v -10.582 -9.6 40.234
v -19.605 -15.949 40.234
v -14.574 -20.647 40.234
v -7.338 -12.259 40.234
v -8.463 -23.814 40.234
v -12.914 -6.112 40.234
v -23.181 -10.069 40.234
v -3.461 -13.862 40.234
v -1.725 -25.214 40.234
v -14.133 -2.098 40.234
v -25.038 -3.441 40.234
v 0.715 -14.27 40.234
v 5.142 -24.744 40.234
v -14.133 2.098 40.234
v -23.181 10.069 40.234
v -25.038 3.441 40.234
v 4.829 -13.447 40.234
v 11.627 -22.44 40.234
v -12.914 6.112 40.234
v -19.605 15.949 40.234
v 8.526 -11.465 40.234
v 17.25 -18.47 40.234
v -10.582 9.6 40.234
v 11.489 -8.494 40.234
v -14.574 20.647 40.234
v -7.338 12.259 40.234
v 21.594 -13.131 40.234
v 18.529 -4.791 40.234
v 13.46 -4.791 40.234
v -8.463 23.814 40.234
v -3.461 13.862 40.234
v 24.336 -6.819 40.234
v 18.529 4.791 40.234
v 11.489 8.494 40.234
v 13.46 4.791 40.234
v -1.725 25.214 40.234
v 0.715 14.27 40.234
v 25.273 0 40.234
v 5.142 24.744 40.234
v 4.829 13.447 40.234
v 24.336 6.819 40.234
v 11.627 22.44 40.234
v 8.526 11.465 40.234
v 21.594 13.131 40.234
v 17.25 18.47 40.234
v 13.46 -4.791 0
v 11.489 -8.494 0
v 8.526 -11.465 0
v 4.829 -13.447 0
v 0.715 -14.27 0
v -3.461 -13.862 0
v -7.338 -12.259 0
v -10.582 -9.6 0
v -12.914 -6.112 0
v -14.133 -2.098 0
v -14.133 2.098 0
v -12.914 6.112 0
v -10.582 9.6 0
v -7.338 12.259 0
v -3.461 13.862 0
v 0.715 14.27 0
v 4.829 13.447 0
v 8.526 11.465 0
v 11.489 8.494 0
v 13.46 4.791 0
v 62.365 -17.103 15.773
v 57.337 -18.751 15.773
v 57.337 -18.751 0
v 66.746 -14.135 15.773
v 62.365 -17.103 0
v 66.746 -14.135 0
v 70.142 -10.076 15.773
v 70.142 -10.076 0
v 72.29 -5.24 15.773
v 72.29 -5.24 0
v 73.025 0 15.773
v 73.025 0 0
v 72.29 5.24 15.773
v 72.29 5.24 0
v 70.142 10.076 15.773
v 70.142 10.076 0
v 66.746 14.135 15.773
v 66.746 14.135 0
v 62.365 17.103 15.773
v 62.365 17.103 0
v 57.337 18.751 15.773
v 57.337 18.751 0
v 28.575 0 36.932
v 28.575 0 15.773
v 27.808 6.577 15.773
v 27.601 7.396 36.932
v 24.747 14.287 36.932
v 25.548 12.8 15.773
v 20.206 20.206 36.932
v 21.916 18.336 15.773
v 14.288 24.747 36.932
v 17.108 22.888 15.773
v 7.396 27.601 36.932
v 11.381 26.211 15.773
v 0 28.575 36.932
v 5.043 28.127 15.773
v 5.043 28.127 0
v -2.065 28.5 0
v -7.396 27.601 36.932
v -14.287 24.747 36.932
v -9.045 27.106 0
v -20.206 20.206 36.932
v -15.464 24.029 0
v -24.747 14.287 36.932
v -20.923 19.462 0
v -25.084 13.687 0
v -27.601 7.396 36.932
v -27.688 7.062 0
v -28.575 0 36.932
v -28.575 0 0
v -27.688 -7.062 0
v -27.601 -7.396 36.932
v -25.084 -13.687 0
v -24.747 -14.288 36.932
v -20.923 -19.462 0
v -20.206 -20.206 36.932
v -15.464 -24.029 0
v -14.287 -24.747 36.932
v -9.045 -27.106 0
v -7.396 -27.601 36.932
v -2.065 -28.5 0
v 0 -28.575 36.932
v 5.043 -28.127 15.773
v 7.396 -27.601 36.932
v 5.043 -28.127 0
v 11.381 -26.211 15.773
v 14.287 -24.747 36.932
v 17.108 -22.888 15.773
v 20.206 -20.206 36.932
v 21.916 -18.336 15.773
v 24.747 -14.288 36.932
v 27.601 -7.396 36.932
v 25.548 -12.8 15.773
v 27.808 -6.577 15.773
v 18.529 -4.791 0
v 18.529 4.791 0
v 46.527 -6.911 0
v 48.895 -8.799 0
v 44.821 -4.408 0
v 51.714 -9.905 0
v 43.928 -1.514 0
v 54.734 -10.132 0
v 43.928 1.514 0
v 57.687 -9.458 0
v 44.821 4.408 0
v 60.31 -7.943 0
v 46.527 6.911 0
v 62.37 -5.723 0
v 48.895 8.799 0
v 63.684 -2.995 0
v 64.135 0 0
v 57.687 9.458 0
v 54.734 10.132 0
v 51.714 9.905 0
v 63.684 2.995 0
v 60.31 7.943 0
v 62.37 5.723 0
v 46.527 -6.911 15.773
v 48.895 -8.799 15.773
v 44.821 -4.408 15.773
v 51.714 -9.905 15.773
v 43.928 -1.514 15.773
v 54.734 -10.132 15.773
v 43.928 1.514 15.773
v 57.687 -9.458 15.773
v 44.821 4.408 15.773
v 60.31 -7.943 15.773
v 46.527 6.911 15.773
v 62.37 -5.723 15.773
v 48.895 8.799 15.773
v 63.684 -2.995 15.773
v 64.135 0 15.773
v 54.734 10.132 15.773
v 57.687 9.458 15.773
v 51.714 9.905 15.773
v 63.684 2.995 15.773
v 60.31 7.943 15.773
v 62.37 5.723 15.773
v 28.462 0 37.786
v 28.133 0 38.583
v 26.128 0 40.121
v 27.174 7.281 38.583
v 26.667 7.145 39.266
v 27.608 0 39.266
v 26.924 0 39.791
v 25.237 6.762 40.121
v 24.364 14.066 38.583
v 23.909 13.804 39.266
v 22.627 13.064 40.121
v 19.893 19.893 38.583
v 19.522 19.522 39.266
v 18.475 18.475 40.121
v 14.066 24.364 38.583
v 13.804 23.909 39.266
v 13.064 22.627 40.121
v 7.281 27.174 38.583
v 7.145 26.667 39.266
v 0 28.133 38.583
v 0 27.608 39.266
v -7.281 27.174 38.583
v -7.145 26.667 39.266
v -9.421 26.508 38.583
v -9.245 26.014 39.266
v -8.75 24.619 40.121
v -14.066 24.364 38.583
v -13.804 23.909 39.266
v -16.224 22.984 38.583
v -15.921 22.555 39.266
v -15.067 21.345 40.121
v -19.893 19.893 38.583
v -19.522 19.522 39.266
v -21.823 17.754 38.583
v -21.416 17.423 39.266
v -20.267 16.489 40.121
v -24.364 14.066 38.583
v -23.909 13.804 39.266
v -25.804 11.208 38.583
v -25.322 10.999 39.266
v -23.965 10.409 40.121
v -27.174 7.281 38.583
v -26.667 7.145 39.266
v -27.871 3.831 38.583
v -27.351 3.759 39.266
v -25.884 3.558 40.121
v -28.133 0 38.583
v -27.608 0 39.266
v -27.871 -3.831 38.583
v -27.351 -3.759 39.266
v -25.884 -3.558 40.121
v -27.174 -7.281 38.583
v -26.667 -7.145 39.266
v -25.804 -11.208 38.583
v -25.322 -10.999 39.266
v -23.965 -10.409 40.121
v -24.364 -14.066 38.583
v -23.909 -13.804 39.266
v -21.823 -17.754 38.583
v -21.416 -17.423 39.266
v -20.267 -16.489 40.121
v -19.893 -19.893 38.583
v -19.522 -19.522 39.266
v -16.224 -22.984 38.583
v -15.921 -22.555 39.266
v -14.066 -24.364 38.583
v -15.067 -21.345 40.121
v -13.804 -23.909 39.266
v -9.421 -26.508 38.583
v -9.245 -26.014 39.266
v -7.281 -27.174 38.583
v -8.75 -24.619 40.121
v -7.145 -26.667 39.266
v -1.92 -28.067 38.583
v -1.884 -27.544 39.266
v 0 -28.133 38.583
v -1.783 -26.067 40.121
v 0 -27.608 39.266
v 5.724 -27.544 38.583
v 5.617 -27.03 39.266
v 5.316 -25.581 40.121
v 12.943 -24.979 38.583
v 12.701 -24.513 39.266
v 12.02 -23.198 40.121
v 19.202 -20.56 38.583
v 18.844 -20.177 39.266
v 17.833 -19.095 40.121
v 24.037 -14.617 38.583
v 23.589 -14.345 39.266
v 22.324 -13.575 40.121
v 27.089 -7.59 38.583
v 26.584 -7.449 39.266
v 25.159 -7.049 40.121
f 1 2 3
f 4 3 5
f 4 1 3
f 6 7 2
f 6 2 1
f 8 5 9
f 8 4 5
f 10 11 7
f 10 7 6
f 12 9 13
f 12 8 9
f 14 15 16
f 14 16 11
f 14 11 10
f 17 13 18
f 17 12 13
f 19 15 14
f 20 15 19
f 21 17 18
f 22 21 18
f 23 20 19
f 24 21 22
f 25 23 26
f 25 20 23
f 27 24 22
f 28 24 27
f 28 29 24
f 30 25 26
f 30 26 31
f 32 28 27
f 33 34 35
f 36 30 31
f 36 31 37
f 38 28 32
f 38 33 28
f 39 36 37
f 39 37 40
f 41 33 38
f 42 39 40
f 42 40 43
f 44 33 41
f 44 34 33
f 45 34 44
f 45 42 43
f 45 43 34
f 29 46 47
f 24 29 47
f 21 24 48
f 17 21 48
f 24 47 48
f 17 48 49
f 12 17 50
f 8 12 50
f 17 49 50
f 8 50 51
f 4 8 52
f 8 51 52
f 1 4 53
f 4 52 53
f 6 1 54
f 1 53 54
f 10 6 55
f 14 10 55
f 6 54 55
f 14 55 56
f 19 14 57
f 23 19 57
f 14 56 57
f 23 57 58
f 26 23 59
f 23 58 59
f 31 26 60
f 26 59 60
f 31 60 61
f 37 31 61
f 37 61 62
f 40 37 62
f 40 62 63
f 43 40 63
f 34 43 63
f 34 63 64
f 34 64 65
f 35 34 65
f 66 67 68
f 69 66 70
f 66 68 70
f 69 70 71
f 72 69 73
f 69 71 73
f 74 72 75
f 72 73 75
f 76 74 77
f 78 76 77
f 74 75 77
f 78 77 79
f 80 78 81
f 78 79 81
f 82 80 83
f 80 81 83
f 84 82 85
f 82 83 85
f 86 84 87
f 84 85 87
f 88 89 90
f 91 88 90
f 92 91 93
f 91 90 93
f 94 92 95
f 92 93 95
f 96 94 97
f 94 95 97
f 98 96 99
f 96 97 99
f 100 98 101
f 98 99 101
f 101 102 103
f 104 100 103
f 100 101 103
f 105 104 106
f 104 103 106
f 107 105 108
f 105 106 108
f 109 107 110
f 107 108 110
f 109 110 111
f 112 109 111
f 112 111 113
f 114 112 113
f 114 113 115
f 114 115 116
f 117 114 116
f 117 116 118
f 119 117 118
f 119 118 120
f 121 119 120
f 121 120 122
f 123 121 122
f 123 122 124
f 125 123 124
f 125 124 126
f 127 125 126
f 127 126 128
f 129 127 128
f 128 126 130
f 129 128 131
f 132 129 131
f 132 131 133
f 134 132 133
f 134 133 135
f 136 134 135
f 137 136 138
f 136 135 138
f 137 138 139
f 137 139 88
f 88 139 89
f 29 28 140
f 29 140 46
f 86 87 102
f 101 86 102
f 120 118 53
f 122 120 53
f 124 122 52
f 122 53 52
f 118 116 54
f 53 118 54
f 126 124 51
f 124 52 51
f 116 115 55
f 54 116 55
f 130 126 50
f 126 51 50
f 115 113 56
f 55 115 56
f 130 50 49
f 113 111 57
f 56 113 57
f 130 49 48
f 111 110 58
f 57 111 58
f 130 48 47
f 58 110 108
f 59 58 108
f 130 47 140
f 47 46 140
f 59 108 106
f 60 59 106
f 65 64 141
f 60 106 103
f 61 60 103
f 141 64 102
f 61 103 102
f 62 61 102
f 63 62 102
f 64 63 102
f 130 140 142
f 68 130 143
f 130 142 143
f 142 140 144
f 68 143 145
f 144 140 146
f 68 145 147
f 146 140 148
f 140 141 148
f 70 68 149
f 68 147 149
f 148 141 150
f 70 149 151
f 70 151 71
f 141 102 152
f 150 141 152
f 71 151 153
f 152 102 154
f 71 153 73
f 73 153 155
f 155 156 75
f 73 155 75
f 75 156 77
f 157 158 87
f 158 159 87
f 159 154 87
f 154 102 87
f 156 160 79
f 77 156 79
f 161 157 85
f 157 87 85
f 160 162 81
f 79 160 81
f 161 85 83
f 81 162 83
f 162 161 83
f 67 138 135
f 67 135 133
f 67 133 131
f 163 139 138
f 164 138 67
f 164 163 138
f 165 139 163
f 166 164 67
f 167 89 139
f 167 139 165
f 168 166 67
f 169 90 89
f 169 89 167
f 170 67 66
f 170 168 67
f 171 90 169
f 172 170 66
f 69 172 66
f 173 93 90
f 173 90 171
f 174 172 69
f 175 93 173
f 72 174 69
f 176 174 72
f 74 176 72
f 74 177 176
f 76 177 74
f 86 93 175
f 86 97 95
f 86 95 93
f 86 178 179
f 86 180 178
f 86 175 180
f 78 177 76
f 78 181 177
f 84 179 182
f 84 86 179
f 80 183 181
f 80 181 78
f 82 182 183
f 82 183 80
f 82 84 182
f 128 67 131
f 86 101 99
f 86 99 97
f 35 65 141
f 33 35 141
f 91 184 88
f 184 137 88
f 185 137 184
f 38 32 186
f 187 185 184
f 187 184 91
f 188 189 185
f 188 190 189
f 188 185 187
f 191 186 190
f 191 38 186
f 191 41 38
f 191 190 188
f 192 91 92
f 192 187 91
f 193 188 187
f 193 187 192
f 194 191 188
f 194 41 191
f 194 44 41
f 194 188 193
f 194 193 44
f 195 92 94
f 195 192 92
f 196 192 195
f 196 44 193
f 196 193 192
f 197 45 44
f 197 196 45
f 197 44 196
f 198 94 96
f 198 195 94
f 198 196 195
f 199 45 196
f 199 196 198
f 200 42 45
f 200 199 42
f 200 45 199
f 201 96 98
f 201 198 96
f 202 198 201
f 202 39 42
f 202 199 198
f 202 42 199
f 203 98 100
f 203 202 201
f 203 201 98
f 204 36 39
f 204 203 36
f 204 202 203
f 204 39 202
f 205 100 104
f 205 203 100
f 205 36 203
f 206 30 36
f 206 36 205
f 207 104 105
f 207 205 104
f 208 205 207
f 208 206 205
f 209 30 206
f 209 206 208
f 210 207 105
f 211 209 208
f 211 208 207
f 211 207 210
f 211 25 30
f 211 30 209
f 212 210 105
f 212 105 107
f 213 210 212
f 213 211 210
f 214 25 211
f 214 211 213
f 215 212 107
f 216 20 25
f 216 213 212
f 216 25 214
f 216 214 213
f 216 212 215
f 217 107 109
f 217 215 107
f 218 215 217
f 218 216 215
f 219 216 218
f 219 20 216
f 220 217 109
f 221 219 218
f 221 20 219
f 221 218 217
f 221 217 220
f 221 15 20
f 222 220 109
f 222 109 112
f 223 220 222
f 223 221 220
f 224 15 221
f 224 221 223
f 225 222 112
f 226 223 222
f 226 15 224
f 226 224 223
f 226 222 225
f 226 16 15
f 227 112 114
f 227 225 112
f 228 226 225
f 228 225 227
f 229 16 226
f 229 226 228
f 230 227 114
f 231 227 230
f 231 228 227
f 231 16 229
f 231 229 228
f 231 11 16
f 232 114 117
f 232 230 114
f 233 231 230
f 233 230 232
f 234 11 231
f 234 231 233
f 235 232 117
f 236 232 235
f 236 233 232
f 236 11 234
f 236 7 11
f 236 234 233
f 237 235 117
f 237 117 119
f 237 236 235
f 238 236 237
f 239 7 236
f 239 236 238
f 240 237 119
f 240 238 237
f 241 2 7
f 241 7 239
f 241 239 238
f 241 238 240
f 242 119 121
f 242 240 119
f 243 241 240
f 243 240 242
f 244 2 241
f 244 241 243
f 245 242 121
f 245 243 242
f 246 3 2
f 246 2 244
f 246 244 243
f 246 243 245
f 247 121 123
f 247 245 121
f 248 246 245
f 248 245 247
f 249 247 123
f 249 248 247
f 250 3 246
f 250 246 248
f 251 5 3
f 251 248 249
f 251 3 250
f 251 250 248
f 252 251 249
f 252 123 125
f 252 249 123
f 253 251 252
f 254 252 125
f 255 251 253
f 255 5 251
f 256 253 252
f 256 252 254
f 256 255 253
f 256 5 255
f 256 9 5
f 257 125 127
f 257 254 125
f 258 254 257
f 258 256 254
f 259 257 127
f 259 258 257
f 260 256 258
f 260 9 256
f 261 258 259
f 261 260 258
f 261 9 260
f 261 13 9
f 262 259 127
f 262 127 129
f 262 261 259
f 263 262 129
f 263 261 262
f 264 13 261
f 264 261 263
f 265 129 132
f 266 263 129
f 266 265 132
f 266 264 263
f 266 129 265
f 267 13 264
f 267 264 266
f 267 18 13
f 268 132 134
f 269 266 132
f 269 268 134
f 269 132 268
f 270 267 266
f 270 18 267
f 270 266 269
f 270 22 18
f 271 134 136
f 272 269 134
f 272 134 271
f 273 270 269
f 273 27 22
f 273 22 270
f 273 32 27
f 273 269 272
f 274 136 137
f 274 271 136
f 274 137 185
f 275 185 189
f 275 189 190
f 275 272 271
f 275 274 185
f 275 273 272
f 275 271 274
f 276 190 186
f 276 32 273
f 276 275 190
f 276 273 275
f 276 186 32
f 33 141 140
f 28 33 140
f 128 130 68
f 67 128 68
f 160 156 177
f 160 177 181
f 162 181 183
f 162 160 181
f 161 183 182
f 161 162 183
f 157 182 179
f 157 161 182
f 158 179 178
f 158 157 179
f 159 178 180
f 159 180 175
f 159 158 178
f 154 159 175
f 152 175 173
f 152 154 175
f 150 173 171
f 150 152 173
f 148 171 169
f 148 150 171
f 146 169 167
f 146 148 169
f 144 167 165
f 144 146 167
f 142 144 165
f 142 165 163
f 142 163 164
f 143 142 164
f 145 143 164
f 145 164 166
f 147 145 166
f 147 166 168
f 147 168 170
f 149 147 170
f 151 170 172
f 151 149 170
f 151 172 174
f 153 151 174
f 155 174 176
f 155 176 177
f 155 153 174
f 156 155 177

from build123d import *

# Parameters (mm, degrees)
F0_R     = 28.575
F1_DEPTH = 40.2336
F2_R     = 10.16
F3_DEPTH = 15.7734
F4_R     = 3.302


with BuildPart() as f1:
    # F0 (on Top) → F1 (new body)
    with BuildSketch(Plane.XY):
        Circle(F0_R)
        with BuildLine():
            ThreePointArc((13.4603984155, -4.790650347), (-14.2875, 0), (13.4603984155, 4.790650347))
            Line((13.4603984155, 4.790650347), (18.5293, 4.790650347))
            Line((18.5293, 4.790650347), (18.5293, 0.035349653))
            Line((18.5293, 0.035349653), (18.5293, -0.035349653))
            Line((18.5293, -0.035349653), (18.5293, -4.790650347))
            Line((18.5293, -4.790650347), (13.4603984155, -4.790650347))
        make_face(mode=Mode.SUBTRACT)
    extrude(amount=F1_DEPTH)

    # F2 (on Top) → F3 (join)
    with BuildSketch(Plane.XY):
        with BuildLine():
            Line((5.0426470588, -28.1265414802), (57.3367647059, -18.7510276535))
            ThreePointArc((57.3367647059, -18.7510276535), (73.025, 0), (57.3367647059, 18.7510276535))
            Line((57.3367647059, 18.7510276535), (5.0426470588, 28.1265414802))
            ThreePointArc((5.0426470588, 28.1265414802), (21.9160245563, 18.3362616868), (28.575, 0))
            ThreePointArc((28.575, 0), (21.9160245563, -18.3362616868), (5.0426470588, -28.1265414802))
        make_face()
        with Locations((53.975, 0)):
            Circle(F2_R, mode=Mode.SUBTRACT)
    extrude(amount=F3_DEPTH)

    # F4
    f4_edges = [f1.edges().sort_by_distance(p)[0] for p in [
        (-28.575, 0, 40.2336),
    ]]
    fillet(f4_edges, radius=F4_R)


solid = f1.part
